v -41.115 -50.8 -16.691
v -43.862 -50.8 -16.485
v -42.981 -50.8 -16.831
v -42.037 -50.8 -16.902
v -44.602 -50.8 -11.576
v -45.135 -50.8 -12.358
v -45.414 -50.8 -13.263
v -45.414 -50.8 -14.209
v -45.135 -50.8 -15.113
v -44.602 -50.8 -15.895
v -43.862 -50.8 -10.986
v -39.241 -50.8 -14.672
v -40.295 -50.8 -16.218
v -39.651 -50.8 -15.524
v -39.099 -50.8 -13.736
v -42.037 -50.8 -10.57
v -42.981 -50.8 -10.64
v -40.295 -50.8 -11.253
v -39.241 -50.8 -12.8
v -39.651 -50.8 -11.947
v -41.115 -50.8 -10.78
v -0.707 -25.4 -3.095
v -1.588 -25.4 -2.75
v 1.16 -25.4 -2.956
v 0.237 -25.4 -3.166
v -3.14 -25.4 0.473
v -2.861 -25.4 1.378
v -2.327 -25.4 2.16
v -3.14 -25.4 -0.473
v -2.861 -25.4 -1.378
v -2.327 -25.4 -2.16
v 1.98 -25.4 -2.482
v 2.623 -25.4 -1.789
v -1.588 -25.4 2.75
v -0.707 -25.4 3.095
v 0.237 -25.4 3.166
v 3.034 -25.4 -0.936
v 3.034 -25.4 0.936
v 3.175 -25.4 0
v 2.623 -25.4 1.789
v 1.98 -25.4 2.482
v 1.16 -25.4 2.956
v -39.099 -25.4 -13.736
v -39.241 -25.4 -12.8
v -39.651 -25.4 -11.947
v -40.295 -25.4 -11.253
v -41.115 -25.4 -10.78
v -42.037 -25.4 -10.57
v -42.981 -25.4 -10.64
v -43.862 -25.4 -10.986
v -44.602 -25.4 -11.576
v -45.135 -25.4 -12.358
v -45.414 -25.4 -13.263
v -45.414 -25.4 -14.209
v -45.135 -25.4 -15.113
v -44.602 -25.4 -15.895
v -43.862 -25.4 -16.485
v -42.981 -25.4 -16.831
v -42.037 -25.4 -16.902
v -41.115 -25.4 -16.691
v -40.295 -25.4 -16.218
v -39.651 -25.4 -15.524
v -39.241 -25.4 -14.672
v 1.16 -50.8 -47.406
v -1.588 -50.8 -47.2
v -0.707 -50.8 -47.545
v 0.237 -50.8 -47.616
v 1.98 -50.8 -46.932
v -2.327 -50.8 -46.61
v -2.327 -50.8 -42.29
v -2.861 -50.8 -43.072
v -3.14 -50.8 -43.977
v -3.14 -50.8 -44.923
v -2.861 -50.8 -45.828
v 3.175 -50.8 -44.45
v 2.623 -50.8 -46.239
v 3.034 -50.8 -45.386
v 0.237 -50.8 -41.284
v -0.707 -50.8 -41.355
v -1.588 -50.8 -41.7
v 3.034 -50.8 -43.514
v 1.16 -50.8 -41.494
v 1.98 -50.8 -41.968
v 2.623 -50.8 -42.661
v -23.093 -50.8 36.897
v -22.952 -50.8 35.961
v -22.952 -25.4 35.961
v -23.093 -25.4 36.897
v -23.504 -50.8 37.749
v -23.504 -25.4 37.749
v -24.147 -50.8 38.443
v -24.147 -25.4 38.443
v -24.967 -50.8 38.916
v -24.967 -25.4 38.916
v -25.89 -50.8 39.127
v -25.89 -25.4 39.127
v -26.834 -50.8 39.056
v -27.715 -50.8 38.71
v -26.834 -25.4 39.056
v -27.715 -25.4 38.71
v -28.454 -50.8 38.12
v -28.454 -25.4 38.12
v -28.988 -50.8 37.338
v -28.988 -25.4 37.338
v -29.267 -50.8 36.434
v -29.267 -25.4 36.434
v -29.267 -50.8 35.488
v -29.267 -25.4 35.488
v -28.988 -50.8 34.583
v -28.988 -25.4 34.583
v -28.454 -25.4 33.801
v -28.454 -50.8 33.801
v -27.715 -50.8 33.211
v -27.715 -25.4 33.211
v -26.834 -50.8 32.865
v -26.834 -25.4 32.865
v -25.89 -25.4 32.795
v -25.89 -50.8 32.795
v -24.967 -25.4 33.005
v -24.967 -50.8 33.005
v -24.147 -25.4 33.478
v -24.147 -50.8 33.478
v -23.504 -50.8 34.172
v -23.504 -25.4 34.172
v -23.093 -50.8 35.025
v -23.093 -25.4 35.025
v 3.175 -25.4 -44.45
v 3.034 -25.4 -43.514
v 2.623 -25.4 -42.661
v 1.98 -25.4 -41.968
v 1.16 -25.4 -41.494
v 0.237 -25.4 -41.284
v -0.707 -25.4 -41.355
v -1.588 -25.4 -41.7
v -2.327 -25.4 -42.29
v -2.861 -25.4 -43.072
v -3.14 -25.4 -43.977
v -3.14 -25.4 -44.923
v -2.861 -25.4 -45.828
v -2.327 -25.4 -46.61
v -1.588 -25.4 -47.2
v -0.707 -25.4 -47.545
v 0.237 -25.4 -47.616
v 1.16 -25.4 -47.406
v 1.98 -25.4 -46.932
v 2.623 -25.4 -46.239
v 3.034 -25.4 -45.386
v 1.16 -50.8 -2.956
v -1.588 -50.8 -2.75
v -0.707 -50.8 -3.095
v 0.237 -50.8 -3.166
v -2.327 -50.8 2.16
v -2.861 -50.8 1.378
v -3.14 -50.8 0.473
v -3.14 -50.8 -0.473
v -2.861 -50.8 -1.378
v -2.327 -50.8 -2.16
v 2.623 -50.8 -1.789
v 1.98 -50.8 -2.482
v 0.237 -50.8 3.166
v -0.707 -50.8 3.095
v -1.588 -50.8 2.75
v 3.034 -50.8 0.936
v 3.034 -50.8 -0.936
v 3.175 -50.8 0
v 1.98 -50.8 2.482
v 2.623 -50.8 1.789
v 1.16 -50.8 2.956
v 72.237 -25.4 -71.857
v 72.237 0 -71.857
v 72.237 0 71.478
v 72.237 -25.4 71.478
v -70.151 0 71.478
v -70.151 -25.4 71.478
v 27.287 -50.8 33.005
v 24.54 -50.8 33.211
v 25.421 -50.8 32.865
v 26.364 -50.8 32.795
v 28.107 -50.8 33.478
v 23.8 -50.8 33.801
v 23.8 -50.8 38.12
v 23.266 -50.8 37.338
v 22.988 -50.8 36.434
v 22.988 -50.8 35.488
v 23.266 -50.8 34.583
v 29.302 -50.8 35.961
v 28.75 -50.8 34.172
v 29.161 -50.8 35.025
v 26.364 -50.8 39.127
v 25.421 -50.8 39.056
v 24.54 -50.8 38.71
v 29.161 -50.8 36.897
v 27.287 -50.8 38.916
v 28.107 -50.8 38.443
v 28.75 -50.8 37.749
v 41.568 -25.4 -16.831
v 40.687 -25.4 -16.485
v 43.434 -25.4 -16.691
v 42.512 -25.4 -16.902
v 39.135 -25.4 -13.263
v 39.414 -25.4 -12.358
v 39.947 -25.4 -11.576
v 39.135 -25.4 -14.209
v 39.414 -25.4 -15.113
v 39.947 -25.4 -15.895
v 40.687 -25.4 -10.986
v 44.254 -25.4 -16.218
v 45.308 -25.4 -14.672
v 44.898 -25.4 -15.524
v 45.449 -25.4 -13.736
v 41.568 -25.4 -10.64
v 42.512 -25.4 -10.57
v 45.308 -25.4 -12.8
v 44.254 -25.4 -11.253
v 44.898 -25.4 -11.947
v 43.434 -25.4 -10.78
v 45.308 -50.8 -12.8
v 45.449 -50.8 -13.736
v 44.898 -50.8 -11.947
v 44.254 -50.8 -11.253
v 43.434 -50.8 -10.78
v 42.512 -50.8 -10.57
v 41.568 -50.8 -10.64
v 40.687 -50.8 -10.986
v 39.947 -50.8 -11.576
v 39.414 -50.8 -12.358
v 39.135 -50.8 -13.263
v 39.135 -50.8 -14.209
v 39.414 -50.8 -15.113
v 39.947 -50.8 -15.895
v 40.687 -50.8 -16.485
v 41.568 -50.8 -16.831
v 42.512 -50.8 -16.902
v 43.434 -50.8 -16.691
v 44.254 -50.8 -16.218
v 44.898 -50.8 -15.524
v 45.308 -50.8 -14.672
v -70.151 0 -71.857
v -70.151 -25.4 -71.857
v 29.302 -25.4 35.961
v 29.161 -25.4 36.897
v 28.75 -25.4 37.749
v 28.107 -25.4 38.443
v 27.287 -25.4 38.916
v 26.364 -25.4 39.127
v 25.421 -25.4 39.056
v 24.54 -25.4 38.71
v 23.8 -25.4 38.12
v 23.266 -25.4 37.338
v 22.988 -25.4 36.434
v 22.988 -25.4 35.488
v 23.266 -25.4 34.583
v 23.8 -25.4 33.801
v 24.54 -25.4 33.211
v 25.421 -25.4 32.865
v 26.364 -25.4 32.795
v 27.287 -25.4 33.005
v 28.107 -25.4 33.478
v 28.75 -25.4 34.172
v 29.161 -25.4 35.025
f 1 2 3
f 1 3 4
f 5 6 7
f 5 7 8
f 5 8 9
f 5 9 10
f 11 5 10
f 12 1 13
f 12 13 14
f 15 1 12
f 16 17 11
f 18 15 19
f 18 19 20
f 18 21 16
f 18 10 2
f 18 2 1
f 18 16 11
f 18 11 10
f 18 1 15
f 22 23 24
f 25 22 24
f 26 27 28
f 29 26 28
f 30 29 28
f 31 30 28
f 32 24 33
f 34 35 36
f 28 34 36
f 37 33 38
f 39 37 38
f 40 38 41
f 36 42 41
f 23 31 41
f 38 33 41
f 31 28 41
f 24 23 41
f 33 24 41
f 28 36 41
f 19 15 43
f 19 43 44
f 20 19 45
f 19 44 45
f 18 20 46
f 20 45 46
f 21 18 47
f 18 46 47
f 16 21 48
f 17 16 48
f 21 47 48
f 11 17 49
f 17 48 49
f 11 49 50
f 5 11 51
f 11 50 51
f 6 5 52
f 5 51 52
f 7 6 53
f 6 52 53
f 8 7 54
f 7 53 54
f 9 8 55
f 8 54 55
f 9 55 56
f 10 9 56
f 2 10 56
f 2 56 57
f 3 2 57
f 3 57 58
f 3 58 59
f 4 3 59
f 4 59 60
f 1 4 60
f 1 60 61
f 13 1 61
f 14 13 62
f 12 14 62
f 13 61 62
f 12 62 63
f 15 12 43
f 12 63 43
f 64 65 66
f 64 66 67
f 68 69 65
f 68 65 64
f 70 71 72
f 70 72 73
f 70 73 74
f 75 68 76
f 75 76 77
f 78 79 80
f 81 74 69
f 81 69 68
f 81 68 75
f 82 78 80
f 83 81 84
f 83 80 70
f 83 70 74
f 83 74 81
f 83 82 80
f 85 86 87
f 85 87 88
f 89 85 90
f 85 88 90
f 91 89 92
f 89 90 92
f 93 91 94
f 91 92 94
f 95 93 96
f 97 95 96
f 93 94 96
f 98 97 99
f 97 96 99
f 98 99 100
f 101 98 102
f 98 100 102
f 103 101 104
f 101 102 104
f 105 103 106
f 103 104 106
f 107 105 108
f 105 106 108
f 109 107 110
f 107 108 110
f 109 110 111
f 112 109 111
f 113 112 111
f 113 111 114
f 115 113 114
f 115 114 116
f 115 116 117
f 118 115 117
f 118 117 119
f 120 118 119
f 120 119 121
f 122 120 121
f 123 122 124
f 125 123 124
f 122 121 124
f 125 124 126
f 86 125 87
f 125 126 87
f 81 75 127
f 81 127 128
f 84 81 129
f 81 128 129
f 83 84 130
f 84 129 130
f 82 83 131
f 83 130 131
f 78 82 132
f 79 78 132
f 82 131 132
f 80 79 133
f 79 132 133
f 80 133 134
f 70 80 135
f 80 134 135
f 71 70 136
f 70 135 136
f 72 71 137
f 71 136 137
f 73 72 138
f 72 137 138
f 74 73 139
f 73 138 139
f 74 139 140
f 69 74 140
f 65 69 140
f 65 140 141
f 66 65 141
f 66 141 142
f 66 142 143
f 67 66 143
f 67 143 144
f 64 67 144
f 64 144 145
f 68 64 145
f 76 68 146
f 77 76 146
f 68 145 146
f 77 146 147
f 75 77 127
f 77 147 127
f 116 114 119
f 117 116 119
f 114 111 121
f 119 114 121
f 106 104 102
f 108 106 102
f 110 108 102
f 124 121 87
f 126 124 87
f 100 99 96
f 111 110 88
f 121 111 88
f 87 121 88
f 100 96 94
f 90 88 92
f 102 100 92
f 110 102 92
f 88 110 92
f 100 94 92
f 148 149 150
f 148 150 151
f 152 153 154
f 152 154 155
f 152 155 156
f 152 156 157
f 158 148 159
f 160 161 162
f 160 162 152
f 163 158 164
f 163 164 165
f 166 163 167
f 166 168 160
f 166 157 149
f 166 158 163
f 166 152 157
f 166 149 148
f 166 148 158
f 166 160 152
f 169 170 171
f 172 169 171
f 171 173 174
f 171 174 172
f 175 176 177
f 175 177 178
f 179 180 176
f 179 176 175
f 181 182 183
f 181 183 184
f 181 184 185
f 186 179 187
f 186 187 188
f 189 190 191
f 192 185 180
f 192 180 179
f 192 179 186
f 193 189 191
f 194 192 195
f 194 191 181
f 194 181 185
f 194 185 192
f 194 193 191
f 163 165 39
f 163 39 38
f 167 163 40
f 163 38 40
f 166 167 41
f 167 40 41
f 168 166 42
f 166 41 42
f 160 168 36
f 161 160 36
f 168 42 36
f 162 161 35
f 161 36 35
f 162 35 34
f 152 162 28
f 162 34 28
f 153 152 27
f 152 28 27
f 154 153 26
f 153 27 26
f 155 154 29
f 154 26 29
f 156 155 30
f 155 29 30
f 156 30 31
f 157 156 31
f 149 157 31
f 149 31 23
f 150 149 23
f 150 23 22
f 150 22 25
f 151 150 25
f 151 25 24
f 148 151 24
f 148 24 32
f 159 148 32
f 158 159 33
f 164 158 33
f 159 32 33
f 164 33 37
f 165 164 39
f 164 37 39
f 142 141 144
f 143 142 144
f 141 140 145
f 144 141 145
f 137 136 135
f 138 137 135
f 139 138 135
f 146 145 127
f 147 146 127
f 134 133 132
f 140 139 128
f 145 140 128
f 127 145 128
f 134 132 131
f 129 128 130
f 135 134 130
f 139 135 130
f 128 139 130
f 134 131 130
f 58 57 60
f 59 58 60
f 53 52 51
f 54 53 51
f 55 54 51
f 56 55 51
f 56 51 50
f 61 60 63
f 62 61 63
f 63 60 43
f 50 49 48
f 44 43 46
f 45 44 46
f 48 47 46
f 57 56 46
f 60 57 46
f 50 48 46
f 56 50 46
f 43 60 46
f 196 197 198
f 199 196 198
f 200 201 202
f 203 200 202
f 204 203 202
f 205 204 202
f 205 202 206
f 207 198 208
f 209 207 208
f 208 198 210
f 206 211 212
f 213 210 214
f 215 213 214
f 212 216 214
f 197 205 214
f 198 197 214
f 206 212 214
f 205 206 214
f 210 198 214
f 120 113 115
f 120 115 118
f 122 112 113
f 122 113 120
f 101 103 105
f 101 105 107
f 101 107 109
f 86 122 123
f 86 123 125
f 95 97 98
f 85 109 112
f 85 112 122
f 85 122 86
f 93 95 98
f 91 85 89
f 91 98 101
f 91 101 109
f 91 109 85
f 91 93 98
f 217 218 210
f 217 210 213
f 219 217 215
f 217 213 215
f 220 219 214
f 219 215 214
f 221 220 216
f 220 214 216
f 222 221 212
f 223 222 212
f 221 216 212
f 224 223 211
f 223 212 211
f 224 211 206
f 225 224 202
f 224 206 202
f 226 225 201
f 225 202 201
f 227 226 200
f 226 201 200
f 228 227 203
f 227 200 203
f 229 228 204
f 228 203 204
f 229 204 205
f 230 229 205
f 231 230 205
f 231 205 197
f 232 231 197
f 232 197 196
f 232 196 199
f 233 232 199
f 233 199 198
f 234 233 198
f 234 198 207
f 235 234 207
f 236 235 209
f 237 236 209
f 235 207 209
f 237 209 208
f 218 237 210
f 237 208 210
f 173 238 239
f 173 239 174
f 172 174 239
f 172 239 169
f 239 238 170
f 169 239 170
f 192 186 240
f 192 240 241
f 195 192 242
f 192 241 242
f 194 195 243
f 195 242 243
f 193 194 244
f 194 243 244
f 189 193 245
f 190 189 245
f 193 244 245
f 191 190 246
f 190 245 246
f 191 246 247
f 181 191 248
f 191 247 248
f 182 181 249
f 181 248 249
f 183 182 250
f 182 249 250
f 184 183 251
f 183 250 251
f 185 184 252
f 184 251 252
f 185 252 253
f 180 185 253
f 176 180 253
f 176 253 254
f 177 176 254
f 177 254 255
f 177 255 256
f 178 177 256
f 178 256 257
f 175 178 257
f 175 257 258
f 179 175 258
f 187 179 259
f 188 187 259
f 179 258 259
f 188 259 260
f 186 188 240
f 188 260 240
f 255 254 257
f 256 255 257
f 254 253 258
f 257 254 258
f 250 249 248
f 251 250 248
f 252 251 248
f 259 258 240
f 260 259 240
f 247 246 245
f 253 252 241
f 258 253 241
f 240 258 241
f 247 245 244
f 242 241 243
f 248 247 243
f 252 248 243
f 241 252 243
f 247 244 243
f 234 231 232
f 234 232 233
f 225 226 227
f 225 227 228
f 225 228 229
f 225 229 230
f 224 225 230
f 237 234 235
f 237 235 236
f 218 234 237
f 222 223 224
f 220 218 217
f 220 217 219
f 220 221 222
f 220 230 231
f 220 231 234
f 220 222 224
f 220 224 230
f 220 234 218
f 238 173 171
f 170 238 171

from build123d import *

# Parameters (mm, degrees)
F0_W     = 142.387465
F0_H     = 143.335446
F1_DEPTH = 25.4
F2_R     = 3.175
F3_DEPTH = 25.4
F4_R     = 3.175
F5_DEPTH = 25.4


with BuildPart() as f1:
    # F0 (on Front) → F1 (new body)
    with BuildSketch(Plane.XZ):
        with Locations((1.042783, -0.189595)):
            Rectangle(F0_W, F0_H)
    extrude(amount=F1_DEPTH)


with BuildPart() as f3:
    # F2 (on face) → F3 (new body)
    with BuildSketch(Plane.XZ.offset(25.4)):
        Circle(F2_R)
    extrude(amount=F3_DEPTH)


with BuildPart() as f5:
    # F4 (on face) → F5 (new body)
    with BuildSketch(Plane.XZ.offset(25.4)):
        with Locations((-42.274462, -13.735805)):
            Circle(F4_R)
        with Locations((-26.127054, 35.960805)):
            Circle(F4_R)
        with Locations((26.127054, 35.960805)):
            Circle(F4_R)
        with Locations((42.274462, -13.735805)):
            Circle(F4_R)
        with Locations((0, -44.45)):
            Circle(F4_R)
    extrude(amount=F5_DEPTH)


solid = Compound([f1.part, f3.part, f5.part])
